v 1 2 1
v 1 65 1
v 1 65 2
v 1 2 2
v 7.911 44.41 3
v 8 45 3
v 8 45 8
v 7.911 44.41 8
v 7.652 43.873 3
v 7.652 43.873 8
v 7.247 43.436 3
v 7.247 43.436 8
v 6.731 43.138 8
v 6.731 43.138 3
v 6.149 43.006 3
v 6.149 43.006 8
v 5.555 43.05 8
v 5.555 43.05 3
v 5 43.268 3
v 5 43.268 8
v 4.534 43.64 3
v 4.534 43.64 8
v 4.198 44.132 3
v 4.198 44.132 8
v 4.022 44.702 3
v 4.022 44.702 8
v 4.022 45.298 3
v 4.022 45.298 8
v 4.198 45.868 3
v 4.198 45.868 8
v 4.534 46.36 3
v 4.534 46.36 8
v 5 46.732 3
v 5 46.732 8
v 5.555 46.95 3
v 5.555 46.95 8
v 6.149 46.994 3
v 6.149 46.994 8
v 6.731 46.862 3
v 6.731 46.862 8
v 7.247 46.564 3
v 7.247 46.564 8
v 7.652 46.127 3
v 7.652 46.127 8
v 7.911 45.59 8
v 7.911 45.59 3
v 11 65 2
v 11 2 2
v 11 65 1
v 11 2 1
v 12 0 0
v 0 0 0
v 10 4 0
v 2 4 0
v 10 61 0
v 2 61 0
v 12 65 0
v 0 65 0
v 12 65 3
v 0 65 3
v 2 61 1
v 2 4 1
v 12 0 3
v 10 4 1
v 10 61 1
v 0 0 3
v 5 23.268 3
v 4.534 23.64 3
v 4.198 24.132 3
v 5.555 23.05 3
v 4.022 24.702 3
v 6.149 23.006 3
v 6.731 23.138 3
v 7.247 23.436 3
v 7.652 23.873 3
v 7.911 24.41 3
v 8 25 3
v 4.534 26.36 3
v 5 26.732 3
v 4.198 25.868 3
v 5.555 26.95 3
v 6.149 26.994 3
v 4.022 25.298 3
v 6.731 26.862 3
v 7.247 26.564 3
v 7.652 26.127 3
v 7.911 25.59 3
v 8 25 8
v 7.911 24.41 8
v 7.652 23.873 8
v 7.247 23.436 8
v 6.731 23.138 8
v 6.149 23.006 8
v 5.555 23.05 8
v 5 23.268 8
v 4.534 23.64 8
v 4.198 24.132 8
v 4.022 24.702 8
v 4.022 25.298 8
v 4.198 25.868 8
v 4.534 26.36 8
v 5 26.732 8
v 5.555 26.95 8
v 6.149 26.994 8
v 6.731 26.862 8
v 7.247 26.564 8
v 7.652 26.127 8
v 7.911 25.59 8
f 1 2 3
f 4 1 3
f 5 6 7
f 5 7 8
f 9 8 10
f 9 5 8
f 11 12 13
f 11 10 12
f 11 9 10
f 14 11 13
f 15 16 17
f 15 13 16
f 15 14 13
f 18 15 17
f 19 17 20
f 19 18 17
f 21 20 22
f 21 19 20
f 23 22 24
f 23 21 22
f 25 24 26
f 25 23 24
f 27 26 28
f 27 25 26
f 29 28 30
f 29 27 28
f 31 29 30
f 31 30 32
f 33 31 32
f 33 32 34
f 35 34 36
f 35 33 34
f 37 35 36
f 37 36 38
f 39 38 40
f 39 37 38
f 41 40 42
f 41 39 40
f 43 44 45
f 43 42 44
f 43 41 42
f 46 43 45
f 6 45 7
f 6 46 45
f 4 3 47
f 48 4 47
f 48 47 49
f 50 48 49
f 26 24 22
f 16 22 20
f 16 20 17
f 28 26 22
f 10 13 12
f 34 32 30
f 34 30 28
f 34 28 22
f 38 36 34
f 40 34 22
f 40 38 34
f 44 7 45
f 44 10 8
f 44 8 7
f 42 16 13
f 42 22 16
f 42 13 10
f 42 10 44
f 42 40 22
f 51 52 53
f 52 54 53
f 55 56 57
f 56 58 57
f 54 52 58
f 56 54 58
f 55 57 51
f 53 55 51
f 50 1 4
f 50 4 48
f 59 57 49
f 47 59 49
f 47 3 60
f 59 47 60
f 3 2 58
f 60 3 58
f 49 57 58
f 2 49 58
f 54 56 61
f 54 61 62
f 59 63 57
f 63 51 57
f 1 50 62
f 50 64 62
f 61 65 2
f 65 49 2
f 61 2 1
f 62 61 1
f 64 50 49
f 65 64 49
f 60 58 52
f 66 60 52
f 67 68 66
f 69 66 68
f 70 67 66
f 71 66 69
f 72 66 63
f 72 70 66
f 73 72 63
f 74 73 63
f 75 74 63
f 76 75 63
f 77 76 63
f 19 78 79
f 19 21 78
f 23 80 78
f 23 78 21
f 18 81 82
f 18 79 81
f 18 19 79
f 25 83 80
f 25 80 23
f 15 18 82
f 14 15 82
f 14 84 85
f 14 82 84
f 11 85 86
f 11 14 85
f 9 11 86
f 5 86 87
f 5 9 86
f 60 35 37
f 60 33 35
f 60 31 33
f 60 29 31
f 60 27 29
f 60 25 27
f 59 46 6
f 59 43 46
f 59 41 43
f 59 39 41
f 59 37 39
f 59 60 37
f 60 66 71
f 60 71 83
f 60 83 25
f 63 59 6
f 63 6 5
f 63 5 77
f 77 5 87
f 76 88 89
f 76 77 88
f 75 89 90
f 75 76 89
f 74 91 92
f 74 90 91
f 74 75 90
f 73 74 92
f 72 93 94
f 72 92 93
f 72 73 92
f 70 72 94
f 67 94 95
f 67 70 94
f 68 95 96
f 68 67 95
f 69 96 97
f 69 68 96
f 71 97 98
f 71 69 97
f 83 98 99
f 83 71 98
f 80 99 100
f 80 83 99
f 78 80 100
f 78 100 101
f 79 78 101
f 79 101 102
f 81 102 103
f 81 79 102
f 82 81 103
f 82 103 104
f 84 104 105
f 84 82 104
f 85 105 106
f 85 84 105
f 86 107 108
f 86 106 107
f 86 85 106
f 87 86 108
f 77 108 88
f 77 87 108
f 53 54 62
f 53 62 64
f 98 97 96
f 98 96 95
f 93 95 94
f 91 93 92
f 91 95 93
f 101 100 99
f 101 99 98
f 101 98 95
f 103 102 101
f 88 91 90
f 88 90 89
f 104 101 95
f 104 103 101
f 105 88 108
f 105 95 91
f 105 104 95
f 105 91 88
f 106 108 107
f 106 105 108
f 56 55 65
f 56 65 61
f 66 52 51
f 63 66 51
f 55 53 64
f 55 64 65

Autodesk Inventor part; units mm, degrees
ref_plane "YZ Plane" through (0, 0, 0) normal (1, 0, 0) x (0, 1, 0)
ref_plane "XZ Plane" through (0, 0, 0) normal (0, 1, 0) x (-1, 0, 0)
ref_plane "XY Plane" through (0, 0, 0) normal (0, 0, 1) x (1, 0, 0)
sketch "Sketch1" plane through (0, 0, 0) normal (0, 0, 1) x (1, 0, 0)
  line L0 (0, 0) -> (12, 0)
  line L1 (12, 0) -> (12, 65)
  line L2 (12, 65) -> (0, 65)
  line L3 (0, 65) -> (0, 0)
  dimension "d0" = 65
  dimension "d1" = 12
extrude "Extrusion1" add sketch "Sketch1" along normal blind 3
sketch "Sketch2" plane through (0, 0, 3) normal (0, 0, 1) x (1, 0, 0)
  circle A0 centre (6, 45) radius 2
  circle A1 centre (6, 25) radius 2
  line L0 (0, 65) -> (0, 0) projected
  line L1 (12, 0) -> (12, 65) projected
  line L2 (12, 65) -> (0, 65) projected
  dimension "d4" = 12
  dimension "d5" = 6
  dimension "d6" = 0
  dimension "d7" = 20
  dimension "d8" = 20
  dimension "d9" = 4
extrude "Extrusion2" add sketch "Sketch2" along normal blind 5
sketch "Sketch3" plane through (0, 65, 0) normal (0, 1, 0) x (1, 0, 0)
  line L0 (1, -2) -> (11, -2)
  line L1 (11, -2) -> (11, -1)
  line L2 (11, -1) -> (1, -1)
  line L3 (1, -1) -> (1, -2)
  line L4 (12, 0) -> (0, 0) projected
  line L5 (0, 0) -> (0, -3) projected
  line L6 (12, 0) -> (12, -3) projected
  dimension "d12" = 1
  dimension "d13" = 1
  dimension "d14" = 1
  dimension "d15" = 1
sketch "Sketch4" plane through (0, 0, 3) normal (0, 0, 1) x (1, 0, 0)
  line L0 (0, 0) -> (12, 0) projected
  line L1 (12, 65) -> (0, 65) projected
  dimension "d16" = 65
extrude "Extrusion3" cut sketch "Sketch3" against normal blind 63
sketch "Sketch5" plane through (0, 0, 0) normal (0, 0, -1) x (-1, 0, 0)
  point P0 (0, 0)
sketch "Sketch6" plane through (0, 0, 0) normal (0, 0, -1) x (-1, 0, 0)
  line L0 (-10, 61) -> (-2, 61)
  line L1 (-2, 61) -> (-2, 4)
  line L2 (-2, 4) -> (-10, 4)
  line L3 (-10, 4) -> (-10, 61)
  line L4 (0, 0) -> (-12, 0) projected
  line L5 (-12, 65) -> (0, 65) projected
  line L6 (0, 65) -> (0, 0) projected
  line L7 (-12, 0) -> (-12, 65) projected
  dimension "d19" = 4
  dimension "d20" = 4
  dimension "d21" = 2
  dimension "d22" = 2
extrude "Extrusion4" cut sketch "Sketch6" against normal up to surface (2 mm away) contours L0 L1 L2 L3
properties part number "covet cover"
